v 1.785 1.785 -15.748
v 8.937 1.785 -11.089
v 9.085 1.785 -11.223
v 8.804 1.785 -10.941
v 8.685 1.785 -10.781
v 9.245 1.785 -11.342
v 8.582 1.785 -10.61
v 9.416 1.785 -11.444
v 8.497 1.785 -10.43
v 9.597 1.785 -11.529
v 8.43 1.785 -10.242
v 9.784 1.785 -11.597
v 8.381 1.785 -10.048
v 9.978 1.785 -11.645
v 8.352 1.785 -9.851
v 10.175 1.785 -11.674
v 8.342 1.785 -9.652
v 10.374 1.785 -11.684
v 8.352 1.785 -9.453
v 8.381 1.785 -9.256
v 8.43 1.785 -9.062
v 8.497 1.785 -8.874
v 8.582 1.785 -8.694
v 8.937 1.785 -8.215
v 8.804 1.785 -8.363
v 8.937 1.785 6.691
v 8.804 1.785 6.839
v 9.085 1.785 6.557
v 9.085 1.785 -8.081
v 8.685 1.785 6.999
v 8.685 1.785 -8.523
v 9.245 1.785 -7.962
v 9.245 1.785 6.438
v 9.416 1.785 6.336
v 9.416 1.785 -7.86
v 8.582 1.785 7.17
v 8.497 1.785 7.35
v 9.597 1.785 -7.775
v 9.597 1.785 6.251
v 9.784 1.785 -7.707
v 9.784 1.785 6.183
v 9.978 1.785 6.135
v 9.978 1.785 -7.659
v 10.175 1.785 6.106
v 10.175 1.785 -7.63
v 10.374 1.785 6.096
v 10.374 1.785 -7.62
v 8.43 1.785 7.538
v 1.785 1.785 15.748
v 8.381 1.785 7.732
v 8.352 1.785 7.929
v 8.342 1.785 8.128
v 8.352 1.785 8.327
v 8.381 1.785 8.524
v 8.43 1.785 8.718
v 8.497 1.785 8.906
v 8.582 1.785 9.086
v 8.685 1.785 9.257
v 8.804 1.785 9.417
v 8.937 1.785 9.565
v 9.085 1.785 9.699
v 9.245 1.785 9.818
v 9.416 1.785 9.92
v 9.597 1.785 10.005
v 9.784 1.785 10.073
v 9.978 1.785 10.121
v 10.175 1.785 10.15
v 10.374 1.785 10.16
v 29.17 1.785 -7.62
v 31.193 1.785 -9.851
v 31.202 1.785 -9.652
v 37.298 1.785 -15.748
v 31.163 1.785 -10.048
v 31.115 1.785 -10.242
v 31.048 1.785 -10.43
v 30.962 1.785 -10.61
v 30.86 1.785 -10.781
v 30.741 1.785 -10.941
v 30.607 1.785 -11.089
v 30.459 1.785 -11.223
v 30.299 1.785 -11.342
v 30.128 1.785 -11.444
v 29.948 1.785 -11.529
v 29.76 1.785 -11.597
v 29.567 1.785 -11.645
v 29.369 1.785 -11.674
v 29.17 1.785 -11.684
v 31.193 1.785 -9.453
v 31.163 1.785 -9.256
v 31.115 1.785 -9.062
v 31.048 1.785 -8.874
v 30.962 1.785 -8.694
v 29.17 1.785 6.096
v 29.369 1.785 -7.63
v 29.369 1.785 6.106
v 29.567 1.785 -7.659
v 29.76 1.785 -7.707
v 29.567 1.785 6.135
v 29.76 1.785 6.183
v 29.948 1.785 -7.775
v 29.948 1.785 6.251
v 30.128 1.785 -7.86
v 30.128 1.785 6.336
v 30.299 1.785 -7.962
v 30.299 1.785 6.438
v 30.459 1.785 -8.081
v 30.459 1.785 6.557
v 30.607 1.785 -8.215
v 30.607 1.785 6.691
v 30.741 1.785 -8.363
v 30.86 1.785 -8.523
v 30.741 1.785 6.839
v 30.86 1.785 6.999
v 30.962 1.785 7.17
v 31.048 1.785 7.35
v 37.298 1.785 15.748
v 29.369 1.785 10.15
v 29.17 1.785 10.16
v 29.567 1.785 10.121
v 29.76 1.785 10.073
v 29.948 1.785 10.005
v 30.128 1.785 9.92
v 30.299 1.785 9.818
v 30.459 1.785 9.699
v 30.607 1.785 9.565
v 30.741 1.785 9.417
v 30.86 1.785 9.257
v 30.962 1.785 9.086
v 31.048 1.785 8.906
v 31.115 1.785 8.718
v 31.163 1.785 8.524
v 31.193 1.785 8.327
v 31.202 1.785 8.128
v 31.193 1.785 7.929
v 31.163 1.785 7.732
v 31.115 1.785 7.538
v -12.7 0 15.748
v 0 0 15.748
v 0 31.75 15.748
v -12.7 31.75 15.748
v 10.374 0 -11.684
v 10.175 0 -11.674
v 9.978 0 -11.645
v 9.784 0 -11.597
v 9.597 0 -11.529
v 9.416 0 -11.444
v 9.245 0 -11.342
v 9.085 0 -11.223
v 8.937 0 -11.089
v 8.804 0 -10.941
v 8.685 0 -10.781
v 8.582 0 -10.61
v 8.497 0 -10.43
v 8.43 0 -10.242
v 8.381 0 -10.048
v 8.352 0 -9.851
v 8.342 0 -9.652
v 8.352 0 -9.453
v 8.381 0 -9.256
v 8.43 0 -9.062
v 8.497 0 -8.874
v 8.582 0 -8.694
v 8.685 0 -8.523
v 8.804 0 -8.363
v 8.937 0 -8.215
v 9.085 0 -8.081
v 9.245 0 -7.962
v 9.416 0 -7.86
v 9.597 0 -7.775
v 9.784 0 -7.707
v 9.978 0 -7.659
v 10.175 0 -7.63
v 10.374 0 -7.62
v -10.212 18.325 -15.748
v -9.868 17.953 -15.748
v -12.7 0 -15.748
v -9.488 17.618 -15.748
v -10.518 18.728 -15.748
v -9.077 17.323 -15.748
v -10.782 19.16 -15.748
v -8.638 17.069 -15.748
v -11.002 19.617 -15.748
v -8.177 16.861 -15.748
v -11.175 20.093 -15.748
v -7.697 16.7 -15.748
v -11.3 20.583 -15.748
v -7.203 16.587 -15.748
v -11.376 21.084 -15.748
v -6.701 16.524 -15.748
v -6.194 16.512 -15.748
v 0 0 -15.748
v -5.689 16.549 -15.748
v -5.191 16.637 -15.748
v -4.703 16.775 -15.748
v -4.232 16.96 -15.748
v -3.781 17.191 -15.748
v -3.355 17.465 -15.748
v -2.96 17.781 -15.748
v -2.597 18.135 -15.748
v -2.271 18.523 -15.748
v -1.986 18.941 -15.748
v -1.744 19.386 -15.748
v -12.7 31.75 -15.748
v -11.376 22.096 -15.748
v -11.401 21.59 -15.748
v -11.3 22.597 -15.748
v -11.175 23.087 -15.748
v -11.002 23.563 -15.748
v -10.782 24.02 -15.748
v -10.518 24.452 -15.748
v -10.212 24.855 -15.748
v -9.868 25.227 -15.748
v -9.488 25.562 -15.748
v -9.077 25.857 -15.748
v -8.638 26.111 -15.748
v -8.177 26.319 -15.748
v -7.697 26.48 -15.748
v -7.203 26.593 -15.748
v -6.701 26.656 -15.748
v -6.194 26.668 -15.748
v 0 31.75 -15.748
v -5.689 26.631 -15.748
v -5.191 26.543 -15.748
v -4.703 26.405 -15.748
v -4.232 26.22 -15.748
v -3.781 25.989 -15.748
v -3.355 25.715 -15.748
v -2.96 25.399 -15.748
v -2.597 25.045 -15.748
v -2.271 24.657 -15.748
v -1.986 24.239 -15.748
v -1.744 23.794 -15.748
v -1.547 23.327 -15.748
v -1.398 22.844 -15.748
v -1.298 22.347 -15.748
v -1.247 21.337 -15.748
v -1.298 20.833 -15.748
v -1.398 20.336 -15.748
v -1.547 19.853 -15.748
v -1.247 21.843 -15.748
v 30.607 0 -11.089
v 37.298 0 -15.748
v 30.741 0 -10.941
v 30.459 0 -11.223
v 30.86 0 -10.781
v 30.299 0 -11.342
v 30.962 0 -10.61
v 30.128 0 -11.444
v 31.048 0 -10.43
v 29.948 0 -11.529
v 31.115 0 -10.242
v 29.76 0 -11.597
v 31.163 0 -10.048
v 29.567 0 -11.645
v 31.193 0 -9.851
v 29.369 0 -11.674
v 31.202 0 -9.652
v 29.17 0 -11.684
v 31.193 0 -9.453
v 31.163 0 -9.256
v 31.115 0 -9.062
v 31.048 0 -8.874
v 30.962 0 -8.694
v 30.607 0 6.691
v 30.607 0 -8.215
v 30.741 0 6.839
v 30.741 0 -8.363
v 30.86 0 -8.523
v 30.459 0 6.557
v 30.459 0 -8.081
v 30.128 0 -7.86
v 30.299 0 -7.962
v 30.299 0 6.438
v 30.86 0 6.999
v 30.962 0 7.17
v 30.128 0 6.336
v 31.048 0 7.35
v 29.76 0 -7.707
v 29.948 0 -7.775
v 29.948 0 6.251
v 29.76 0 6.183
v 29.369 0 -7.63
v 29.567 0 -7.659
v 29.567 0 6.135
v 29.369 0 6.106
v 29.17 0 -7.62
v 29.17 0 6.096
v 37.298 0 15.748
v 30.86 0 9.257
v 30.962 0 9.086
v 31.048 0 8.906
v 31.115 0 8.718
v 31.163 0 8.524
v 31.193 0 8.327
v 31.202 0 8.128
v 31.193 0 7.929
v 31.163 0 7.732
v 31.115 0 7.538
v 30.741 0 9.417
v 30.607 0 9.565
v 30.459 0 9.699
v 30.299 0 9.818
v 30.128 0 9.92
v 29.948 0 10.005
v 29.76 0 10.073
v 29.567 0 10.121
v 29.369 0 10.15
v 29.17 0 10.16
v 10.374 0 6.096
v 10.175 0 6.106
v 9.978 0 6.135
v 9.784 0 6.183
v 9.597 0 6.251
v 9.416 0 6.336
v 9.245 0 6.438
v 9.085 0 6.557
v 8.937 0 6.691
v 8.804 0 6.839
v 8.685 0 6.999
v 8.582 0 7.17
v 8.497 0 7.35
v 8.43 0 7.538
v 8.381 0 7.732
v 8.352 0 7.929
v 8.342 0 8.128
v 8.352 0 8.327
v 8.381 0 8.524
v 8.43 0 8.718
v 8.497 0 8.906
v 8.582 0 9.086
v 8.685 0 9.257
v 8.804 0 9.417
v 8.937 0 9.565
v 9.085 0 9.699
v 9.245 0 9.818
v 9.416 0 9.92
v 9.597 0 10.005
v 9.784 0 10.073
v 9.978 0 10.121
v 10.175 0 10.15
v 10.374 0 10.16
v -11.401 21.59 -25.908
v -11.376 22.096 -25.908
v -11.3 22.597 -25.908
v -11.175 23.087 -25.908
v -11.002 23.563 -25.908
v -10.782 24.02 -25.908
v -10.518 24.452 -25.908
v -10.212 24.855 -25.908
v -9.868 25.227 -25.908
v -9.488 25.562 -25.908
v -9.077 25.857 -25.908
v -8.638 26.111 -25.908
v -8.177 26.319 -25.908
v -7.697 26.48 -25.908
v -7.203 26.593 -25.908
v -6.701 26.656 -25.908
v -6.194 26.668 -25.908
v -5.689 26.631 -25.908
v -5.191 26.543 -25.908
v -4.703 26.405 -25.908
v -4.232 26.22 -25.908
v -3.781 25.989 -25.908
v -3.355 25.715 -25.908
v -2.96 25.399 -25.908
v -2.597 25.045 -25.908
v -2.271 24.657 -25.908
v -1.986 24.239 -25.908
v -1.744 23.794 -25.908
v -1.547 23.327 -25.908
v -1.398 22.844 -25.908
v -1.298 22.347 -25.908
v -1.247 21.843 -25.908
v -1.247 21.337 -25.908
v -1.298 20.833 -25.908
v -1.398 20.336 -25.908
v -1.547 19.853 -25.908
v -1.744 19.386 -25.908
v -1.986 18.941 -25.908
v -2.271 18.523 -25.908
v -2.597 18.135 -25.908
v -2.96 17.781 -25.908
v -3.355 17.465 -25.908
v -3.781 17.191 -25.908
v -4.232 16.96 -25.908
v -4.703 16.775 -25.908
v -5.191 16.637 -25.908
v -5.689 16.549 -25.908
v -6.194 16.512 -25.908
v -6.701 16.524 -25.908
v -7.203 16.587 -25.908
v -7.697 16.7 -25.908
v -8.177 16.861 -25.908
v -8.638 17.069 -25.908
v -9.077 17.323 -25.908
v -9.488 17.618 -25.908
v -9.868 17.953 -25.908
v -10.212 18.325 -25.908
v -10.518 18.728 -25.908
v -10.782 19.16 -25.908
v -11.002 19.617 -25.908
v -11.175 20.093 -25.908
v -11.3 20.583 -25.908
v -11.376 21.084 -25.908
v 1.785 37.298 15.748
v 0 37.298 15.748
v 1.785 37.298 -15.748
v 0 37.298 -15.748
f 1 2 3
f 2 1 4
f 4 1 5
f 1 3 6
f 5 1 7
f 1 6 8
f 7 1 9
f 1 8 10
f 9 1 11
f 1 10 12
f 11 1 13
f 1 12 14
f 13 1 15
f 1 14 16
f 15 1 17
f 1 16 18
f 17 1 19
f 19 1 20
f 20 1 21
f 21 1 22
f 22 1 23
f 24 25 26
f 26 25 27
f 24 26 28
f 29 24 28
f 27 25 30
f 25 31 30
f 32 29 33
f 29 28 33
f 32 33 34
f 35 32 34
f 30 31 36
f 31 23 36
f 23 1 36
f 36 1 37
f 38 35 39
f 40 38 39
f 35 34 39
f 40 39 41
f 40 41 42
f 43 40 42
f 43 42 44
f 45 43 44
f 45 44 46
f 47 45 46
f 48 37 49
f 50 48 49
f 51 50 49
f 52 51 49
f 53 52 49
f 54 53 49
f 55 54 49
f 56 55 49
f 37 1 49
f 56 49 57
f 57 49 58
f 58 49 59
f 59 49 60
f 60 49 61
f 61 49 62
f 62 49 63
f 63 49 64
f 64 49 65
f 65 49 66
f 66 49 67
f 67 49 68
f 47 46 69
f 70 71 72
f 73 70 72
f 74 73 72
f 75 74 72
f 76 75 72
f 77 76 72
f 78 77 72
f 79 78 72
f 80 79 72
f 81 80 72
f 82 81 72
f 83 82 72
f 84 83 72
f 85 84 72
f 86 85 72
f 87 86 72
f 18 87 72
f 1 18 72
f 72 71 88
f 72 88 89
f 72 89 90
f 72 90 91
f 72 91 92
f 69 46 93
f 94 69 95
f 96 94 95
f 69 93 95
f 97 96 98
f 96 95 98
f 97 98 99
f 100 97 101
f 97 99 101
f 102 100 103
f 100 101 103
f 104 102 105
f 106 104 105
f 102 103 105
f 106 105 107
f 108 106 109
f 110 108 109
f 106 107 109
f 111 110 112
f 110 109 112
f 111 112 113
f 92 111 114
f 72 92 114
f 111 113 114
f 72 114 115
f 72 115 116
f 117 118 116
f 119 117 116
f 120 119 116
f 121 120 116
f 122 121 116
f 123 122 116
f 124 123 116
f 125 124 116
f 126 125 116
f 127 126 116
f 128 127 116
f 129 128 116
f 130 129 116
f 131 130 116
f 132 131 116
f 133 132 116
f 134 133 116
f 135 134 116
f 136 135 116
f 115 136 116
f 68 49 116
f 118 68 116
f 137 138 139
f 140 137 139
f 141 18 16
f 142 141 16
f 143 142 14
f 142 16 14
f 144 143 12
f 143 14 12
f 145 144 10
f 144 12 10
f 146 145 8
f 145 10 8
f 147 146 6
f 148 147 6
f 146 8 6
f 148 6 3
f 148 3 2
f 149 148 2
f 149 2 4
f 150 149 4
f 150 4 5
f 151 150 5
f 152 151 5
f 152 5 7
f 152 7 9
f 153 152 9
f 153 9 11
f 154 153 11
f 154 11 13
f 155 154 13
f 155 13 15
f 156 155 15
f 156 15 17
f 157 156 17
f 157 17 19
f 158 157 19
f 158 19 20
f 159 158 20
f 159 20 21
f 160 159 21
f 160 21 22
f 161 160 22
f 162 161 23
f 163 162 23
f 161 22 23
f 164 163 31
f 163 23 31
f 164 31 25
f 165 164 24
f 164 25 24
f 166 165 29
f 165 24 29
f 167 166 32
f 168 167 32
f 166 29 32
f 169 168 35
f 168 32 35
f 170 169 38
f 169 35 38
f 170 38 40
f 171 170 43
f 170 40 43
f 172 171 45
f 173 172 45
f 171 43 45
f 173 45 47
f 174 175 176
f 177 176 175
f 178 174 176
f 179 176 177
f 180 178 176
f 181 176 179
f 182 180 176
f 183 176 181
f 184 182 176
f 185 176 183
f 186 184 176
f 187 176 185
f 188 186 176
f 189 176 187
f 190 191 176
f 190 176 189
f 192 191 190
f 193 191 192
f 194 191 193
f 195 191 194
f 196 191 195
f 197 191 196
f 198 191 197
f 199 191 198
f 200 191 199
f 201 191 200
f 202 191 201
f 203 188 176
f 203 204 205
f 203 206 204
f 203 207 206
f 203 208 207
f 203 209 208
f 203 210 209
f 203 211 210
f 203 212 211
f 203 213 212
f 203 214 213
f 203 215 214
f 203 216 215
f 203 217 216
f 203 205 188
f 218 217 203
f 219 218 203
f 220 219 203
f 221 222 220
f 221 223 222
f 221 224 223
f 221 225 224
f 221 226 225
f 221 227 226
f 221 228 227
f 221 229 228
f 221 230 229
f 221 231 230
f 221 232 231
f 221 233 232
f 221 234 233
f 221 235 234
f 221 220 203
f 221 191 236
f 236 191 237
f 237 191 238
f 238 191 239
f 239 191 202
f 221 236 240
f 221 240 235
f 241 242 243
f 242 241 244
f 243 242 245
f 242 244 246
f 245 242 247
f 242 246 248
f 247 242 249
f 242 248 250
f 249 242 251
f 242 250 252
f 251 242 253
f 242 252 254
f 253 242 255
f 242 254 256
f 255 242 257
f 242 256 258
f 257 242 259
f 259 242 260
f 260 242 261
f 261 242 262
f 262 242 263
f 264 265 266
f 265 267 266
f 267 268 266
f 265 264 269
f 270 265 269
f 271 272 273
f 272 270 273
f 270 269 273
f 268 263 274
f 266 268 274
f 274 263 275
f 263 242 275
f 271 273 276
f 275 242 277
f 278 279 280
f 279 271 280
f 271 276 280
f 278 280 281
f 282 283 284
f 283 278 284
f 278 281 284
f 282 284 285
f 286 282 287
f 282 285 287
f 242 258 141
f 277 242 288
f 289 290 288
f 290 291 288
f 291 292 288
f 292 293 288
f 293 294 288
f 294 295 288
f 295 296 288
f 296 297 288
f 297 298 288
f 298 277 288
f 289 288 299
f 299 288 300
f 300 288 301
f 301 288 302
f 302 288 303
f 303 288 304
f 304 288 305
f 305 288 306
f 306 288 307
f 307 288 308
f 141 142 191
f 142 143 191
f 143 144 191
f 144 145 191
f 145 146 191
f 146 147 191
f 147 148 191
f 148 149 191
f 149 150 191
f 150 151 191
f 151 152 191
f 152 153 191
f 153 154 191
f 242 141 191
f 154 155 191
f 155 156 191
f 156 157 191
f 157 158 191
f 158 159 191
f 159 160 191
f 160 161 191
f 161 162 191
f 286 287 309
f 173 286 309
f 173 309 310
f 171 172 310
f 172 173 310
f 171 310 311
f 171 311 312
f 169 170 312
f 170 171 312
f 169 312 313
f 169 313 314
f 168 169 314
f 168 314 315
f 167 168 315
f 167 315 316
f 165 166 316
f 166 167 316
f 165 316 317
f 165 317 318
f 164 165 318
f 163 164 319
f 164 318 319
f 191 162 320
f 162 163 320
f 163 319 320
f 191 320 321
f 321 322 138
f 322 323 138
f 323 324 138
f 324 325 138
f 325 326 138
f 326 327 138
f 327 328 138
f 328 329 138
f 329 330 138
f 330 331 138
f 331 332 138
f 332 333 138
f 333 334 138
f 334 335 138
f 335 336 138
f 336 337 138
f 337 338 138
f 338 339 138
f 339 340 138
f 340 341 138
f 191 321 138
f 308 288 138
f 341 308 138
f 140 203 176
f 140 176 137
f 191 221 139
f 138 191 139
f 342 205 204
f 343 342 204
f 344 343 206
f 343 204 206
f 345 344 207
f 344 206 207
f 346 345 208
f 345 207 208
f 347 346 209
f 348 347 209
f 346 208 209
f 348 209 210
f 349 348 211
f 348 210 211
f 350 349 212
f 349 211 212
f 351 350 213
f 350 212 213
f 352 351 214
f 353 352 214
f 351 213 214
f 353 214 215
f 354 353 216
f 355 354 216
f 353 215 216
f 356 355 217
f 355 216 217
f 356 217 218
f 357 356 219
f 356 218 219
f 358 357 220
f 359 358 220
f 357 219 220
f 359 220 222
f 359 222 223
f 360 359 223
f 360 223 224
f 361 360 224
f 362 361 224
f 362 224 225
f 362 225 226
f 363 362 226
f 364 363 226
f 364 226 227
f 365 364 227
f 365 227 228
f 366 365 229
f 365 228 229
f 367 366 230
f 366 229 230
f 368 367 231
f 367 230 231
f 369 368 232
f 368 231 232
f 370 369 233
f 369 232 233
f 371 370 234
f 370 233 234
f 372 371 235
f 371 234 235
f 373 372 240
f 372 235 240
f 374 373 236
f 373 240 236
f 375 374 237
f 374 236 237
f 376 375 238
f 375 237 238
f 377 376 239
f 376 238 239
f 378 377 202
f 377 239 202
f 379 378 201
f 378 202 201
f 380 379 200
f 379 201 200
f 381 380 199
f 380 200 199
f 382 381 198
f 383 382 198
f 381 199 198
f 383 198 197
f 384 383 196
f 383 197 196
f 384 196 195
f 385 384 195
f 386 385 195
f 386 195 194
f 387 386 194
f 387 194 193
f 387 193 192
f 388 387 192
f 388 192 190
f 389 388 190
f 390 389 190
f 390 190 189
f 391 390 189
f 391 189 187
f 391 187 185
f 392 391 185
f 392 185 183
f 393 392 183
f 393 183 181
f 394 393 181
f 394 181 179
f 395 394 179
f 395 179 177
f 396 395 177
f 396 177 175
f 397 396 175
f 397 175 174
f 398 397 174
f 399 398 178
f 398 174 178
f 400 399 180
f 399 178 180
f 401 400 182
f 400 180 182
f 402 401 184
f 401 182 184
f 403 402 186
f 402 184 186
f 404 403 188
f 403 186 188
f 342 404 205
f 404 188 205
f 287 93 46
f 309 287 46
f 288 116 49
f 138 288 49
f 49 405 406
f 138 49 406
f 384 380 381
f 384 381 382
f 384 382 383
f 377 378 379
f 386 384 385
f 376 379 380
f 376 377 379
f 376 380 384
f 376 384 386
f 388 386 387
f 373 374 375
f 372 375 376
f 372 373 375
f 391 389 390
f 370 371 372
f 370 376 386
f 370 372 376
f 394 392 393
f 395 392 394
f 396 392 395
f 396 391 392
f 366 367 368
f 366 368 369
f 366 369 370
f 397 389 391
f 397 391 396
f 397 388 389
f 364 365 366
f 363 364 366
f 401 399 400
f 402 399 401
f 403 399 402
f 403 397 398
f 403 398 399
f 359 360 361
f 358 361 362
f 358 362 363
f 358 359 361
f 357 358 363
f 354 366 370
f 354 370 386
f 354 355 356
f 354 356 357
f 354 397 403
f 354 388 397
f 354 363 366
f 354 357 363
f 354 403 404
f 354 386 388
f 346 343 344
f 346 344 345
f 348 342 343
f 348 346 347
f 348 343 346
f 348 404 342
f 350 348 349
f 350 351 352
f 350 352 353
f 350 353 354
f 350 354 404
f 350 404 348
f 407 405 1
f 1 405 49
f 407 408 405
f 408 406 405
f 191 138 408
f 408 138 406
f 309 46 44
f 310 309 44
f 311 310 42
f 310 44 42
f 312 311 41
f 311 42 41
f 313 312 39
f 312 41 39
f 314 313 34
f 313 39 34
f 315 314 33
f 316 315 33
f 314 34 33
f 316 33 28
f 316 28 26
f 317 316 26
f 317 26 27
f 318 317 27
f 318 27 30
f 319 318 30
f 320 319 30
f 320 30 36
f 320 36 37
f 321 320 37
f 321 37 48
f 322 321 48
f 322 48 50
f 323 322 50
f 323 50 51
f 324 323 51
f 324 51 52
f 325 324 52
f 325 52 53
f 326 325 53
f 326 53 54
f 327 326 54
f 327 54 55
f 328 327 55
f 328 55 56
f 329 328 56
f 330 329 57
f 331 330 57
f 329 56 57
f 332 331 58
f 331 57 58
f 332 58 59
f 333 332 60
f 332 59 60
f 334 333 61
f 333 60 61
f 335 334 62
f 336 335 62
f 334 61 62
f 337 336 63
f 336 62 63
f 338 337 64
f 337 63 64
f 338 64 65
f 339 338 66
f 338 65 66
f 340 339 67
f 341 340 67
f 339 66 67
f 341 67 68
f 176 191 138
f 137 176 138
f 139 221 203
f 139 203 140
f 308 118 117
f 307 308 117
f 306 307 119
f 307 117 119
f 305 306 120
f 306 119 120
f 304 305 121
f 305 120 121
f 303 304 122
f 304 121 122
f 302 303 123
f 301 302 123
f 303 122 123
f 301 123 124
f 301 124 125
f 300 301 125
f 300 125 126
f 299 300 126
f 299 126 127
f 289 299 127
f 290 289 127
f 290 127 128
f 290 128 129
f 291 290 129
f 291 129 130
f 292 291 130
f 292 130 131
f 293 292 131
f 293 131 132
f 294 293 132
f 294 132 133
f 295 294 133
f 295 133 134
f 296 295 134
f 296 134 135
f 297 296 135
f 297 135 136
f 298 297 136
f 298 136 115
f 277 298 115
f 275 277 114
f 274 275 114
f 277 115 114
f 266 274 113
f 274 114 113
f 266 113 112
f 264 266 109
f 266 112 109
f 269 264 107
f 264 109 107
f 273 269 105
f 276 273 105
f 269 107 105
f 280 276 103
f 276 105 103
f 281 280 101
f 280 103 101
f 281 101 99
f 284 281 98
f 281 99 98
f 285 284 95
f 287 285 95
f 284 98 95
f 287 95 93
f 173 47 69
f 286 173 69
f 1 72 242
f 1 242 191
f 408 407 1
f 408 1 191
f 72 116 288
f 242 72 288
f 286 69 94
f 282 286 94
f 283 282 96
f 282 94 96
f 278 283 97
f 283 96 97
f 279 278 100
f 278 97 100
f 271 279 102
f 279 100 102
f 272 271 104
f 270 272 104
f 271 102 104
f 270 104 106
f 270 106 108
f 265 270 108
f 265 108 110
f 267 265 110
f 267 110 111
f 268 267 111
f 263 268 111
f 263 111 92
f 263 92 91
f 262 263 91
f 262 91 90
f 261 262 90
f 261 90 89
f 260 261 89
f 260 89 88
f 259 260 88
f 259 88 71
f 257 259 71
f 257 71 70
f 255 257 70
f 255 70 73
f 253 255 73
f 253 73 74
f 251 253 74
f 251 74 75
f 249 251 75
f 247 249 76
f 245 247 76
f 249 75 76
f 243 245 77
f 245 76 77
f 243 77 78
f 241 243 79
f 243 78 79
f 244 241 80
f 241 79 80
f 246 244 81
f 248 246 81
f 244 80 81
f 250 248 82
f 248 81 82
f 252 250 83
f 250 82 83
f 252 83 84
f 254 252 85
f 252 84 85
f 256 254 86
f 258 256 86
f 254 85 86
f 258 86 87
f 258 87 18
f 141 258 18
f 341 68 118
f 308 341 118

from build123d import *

# Parameters (mm, degrees)
BOSS_EXTRUDE1_DEPTH = 15.748
SKETCH2_W           = 31.496
SKETCH2_H           = 31.75
BOSS_EXTRUDE2_DEPTH = 12.7
SKETCH4_R           = 5.08
BOSS_EXTRUDE3_DEPTH = 10.16
CUT_EXTRUDE1_DEPTH  = 2.784907768
LPATTERN1_COUNT     = 2
LPATTERN1_PITCH     = 17.78


with BuildPart() as part:
    # Sketch1 → Boss-Extrude1 (new body, symmetric)
    with BuildSketch(Plane.XY):
        Polygon((0, 0), (0, 37.298312705), (1.784907768, 37.298312705), (1.784907768, 1.784907768), (37.298312705, 1.784907768), (37.298312705, 0), align=None)
    extrude(amount=BOSS_EXTRUDE1_DEPTH, both=True)

    # Sketch6 → Cut-Extrude1 (cut, through all)
    with BuildSketch(Plane(origin=(0, 1.784907768, 0), x_dir=(1, 0, 0), z_dir=(0, 1, 0))):
        with BuildLine():
            Line((29.170312705, 11.684), (10.374312705, 11.684))
            ThreePointArc((10.374312705, 11.684), (8.342312705, 9.652), (10.374312705, 7.62))
            Line((10.374312705, 7.62), (29.170312705, 7.62))
            ThreePointArc((29.170312705, 7.62), (31.202312705, 9.652), (29.170312705, 11.684))
        make_face()
    cut_extrude1 = extrude(amount=-CUT_EXTRUDE1_DEPTH, mode=Mode.SUBTRACT)

    # LPattern1: Cut-Extrude1 ×2
    with Locations(*[(0, 0, i * LPATTERN1_PITCH) for i in range(1, LPATTERN1_COUNT)]):
        add(cut_extrude1, mode=Mode.SUBTRACT)


with BuildPart() as body_2:
    # Sketch2 → Boss-Extrude2 (new body)
    with BuildSketch(Plane.ZY):
        with Locations((0, 15.875)):
            Rectangle(SKETCH2_W, SKETCH2_H)
    extrude(amount=BOSS_EXTRUDE2_DEPTH)

    # Sketch4 → Boss-Extrude3 (add)
    with BuildSketch(Plane(origin=(0, 0, -15.748), x_dir=(-1, 0, 0), z_dir=(0, 0, -1))):
        with Locations((6.320909995, 21.59)):
            Circle(SKETCH4_R)
    extrude(amount=BOSS_EXTRUDE3_DEPTH)


solid = Compound([part.part, body_2.part])
